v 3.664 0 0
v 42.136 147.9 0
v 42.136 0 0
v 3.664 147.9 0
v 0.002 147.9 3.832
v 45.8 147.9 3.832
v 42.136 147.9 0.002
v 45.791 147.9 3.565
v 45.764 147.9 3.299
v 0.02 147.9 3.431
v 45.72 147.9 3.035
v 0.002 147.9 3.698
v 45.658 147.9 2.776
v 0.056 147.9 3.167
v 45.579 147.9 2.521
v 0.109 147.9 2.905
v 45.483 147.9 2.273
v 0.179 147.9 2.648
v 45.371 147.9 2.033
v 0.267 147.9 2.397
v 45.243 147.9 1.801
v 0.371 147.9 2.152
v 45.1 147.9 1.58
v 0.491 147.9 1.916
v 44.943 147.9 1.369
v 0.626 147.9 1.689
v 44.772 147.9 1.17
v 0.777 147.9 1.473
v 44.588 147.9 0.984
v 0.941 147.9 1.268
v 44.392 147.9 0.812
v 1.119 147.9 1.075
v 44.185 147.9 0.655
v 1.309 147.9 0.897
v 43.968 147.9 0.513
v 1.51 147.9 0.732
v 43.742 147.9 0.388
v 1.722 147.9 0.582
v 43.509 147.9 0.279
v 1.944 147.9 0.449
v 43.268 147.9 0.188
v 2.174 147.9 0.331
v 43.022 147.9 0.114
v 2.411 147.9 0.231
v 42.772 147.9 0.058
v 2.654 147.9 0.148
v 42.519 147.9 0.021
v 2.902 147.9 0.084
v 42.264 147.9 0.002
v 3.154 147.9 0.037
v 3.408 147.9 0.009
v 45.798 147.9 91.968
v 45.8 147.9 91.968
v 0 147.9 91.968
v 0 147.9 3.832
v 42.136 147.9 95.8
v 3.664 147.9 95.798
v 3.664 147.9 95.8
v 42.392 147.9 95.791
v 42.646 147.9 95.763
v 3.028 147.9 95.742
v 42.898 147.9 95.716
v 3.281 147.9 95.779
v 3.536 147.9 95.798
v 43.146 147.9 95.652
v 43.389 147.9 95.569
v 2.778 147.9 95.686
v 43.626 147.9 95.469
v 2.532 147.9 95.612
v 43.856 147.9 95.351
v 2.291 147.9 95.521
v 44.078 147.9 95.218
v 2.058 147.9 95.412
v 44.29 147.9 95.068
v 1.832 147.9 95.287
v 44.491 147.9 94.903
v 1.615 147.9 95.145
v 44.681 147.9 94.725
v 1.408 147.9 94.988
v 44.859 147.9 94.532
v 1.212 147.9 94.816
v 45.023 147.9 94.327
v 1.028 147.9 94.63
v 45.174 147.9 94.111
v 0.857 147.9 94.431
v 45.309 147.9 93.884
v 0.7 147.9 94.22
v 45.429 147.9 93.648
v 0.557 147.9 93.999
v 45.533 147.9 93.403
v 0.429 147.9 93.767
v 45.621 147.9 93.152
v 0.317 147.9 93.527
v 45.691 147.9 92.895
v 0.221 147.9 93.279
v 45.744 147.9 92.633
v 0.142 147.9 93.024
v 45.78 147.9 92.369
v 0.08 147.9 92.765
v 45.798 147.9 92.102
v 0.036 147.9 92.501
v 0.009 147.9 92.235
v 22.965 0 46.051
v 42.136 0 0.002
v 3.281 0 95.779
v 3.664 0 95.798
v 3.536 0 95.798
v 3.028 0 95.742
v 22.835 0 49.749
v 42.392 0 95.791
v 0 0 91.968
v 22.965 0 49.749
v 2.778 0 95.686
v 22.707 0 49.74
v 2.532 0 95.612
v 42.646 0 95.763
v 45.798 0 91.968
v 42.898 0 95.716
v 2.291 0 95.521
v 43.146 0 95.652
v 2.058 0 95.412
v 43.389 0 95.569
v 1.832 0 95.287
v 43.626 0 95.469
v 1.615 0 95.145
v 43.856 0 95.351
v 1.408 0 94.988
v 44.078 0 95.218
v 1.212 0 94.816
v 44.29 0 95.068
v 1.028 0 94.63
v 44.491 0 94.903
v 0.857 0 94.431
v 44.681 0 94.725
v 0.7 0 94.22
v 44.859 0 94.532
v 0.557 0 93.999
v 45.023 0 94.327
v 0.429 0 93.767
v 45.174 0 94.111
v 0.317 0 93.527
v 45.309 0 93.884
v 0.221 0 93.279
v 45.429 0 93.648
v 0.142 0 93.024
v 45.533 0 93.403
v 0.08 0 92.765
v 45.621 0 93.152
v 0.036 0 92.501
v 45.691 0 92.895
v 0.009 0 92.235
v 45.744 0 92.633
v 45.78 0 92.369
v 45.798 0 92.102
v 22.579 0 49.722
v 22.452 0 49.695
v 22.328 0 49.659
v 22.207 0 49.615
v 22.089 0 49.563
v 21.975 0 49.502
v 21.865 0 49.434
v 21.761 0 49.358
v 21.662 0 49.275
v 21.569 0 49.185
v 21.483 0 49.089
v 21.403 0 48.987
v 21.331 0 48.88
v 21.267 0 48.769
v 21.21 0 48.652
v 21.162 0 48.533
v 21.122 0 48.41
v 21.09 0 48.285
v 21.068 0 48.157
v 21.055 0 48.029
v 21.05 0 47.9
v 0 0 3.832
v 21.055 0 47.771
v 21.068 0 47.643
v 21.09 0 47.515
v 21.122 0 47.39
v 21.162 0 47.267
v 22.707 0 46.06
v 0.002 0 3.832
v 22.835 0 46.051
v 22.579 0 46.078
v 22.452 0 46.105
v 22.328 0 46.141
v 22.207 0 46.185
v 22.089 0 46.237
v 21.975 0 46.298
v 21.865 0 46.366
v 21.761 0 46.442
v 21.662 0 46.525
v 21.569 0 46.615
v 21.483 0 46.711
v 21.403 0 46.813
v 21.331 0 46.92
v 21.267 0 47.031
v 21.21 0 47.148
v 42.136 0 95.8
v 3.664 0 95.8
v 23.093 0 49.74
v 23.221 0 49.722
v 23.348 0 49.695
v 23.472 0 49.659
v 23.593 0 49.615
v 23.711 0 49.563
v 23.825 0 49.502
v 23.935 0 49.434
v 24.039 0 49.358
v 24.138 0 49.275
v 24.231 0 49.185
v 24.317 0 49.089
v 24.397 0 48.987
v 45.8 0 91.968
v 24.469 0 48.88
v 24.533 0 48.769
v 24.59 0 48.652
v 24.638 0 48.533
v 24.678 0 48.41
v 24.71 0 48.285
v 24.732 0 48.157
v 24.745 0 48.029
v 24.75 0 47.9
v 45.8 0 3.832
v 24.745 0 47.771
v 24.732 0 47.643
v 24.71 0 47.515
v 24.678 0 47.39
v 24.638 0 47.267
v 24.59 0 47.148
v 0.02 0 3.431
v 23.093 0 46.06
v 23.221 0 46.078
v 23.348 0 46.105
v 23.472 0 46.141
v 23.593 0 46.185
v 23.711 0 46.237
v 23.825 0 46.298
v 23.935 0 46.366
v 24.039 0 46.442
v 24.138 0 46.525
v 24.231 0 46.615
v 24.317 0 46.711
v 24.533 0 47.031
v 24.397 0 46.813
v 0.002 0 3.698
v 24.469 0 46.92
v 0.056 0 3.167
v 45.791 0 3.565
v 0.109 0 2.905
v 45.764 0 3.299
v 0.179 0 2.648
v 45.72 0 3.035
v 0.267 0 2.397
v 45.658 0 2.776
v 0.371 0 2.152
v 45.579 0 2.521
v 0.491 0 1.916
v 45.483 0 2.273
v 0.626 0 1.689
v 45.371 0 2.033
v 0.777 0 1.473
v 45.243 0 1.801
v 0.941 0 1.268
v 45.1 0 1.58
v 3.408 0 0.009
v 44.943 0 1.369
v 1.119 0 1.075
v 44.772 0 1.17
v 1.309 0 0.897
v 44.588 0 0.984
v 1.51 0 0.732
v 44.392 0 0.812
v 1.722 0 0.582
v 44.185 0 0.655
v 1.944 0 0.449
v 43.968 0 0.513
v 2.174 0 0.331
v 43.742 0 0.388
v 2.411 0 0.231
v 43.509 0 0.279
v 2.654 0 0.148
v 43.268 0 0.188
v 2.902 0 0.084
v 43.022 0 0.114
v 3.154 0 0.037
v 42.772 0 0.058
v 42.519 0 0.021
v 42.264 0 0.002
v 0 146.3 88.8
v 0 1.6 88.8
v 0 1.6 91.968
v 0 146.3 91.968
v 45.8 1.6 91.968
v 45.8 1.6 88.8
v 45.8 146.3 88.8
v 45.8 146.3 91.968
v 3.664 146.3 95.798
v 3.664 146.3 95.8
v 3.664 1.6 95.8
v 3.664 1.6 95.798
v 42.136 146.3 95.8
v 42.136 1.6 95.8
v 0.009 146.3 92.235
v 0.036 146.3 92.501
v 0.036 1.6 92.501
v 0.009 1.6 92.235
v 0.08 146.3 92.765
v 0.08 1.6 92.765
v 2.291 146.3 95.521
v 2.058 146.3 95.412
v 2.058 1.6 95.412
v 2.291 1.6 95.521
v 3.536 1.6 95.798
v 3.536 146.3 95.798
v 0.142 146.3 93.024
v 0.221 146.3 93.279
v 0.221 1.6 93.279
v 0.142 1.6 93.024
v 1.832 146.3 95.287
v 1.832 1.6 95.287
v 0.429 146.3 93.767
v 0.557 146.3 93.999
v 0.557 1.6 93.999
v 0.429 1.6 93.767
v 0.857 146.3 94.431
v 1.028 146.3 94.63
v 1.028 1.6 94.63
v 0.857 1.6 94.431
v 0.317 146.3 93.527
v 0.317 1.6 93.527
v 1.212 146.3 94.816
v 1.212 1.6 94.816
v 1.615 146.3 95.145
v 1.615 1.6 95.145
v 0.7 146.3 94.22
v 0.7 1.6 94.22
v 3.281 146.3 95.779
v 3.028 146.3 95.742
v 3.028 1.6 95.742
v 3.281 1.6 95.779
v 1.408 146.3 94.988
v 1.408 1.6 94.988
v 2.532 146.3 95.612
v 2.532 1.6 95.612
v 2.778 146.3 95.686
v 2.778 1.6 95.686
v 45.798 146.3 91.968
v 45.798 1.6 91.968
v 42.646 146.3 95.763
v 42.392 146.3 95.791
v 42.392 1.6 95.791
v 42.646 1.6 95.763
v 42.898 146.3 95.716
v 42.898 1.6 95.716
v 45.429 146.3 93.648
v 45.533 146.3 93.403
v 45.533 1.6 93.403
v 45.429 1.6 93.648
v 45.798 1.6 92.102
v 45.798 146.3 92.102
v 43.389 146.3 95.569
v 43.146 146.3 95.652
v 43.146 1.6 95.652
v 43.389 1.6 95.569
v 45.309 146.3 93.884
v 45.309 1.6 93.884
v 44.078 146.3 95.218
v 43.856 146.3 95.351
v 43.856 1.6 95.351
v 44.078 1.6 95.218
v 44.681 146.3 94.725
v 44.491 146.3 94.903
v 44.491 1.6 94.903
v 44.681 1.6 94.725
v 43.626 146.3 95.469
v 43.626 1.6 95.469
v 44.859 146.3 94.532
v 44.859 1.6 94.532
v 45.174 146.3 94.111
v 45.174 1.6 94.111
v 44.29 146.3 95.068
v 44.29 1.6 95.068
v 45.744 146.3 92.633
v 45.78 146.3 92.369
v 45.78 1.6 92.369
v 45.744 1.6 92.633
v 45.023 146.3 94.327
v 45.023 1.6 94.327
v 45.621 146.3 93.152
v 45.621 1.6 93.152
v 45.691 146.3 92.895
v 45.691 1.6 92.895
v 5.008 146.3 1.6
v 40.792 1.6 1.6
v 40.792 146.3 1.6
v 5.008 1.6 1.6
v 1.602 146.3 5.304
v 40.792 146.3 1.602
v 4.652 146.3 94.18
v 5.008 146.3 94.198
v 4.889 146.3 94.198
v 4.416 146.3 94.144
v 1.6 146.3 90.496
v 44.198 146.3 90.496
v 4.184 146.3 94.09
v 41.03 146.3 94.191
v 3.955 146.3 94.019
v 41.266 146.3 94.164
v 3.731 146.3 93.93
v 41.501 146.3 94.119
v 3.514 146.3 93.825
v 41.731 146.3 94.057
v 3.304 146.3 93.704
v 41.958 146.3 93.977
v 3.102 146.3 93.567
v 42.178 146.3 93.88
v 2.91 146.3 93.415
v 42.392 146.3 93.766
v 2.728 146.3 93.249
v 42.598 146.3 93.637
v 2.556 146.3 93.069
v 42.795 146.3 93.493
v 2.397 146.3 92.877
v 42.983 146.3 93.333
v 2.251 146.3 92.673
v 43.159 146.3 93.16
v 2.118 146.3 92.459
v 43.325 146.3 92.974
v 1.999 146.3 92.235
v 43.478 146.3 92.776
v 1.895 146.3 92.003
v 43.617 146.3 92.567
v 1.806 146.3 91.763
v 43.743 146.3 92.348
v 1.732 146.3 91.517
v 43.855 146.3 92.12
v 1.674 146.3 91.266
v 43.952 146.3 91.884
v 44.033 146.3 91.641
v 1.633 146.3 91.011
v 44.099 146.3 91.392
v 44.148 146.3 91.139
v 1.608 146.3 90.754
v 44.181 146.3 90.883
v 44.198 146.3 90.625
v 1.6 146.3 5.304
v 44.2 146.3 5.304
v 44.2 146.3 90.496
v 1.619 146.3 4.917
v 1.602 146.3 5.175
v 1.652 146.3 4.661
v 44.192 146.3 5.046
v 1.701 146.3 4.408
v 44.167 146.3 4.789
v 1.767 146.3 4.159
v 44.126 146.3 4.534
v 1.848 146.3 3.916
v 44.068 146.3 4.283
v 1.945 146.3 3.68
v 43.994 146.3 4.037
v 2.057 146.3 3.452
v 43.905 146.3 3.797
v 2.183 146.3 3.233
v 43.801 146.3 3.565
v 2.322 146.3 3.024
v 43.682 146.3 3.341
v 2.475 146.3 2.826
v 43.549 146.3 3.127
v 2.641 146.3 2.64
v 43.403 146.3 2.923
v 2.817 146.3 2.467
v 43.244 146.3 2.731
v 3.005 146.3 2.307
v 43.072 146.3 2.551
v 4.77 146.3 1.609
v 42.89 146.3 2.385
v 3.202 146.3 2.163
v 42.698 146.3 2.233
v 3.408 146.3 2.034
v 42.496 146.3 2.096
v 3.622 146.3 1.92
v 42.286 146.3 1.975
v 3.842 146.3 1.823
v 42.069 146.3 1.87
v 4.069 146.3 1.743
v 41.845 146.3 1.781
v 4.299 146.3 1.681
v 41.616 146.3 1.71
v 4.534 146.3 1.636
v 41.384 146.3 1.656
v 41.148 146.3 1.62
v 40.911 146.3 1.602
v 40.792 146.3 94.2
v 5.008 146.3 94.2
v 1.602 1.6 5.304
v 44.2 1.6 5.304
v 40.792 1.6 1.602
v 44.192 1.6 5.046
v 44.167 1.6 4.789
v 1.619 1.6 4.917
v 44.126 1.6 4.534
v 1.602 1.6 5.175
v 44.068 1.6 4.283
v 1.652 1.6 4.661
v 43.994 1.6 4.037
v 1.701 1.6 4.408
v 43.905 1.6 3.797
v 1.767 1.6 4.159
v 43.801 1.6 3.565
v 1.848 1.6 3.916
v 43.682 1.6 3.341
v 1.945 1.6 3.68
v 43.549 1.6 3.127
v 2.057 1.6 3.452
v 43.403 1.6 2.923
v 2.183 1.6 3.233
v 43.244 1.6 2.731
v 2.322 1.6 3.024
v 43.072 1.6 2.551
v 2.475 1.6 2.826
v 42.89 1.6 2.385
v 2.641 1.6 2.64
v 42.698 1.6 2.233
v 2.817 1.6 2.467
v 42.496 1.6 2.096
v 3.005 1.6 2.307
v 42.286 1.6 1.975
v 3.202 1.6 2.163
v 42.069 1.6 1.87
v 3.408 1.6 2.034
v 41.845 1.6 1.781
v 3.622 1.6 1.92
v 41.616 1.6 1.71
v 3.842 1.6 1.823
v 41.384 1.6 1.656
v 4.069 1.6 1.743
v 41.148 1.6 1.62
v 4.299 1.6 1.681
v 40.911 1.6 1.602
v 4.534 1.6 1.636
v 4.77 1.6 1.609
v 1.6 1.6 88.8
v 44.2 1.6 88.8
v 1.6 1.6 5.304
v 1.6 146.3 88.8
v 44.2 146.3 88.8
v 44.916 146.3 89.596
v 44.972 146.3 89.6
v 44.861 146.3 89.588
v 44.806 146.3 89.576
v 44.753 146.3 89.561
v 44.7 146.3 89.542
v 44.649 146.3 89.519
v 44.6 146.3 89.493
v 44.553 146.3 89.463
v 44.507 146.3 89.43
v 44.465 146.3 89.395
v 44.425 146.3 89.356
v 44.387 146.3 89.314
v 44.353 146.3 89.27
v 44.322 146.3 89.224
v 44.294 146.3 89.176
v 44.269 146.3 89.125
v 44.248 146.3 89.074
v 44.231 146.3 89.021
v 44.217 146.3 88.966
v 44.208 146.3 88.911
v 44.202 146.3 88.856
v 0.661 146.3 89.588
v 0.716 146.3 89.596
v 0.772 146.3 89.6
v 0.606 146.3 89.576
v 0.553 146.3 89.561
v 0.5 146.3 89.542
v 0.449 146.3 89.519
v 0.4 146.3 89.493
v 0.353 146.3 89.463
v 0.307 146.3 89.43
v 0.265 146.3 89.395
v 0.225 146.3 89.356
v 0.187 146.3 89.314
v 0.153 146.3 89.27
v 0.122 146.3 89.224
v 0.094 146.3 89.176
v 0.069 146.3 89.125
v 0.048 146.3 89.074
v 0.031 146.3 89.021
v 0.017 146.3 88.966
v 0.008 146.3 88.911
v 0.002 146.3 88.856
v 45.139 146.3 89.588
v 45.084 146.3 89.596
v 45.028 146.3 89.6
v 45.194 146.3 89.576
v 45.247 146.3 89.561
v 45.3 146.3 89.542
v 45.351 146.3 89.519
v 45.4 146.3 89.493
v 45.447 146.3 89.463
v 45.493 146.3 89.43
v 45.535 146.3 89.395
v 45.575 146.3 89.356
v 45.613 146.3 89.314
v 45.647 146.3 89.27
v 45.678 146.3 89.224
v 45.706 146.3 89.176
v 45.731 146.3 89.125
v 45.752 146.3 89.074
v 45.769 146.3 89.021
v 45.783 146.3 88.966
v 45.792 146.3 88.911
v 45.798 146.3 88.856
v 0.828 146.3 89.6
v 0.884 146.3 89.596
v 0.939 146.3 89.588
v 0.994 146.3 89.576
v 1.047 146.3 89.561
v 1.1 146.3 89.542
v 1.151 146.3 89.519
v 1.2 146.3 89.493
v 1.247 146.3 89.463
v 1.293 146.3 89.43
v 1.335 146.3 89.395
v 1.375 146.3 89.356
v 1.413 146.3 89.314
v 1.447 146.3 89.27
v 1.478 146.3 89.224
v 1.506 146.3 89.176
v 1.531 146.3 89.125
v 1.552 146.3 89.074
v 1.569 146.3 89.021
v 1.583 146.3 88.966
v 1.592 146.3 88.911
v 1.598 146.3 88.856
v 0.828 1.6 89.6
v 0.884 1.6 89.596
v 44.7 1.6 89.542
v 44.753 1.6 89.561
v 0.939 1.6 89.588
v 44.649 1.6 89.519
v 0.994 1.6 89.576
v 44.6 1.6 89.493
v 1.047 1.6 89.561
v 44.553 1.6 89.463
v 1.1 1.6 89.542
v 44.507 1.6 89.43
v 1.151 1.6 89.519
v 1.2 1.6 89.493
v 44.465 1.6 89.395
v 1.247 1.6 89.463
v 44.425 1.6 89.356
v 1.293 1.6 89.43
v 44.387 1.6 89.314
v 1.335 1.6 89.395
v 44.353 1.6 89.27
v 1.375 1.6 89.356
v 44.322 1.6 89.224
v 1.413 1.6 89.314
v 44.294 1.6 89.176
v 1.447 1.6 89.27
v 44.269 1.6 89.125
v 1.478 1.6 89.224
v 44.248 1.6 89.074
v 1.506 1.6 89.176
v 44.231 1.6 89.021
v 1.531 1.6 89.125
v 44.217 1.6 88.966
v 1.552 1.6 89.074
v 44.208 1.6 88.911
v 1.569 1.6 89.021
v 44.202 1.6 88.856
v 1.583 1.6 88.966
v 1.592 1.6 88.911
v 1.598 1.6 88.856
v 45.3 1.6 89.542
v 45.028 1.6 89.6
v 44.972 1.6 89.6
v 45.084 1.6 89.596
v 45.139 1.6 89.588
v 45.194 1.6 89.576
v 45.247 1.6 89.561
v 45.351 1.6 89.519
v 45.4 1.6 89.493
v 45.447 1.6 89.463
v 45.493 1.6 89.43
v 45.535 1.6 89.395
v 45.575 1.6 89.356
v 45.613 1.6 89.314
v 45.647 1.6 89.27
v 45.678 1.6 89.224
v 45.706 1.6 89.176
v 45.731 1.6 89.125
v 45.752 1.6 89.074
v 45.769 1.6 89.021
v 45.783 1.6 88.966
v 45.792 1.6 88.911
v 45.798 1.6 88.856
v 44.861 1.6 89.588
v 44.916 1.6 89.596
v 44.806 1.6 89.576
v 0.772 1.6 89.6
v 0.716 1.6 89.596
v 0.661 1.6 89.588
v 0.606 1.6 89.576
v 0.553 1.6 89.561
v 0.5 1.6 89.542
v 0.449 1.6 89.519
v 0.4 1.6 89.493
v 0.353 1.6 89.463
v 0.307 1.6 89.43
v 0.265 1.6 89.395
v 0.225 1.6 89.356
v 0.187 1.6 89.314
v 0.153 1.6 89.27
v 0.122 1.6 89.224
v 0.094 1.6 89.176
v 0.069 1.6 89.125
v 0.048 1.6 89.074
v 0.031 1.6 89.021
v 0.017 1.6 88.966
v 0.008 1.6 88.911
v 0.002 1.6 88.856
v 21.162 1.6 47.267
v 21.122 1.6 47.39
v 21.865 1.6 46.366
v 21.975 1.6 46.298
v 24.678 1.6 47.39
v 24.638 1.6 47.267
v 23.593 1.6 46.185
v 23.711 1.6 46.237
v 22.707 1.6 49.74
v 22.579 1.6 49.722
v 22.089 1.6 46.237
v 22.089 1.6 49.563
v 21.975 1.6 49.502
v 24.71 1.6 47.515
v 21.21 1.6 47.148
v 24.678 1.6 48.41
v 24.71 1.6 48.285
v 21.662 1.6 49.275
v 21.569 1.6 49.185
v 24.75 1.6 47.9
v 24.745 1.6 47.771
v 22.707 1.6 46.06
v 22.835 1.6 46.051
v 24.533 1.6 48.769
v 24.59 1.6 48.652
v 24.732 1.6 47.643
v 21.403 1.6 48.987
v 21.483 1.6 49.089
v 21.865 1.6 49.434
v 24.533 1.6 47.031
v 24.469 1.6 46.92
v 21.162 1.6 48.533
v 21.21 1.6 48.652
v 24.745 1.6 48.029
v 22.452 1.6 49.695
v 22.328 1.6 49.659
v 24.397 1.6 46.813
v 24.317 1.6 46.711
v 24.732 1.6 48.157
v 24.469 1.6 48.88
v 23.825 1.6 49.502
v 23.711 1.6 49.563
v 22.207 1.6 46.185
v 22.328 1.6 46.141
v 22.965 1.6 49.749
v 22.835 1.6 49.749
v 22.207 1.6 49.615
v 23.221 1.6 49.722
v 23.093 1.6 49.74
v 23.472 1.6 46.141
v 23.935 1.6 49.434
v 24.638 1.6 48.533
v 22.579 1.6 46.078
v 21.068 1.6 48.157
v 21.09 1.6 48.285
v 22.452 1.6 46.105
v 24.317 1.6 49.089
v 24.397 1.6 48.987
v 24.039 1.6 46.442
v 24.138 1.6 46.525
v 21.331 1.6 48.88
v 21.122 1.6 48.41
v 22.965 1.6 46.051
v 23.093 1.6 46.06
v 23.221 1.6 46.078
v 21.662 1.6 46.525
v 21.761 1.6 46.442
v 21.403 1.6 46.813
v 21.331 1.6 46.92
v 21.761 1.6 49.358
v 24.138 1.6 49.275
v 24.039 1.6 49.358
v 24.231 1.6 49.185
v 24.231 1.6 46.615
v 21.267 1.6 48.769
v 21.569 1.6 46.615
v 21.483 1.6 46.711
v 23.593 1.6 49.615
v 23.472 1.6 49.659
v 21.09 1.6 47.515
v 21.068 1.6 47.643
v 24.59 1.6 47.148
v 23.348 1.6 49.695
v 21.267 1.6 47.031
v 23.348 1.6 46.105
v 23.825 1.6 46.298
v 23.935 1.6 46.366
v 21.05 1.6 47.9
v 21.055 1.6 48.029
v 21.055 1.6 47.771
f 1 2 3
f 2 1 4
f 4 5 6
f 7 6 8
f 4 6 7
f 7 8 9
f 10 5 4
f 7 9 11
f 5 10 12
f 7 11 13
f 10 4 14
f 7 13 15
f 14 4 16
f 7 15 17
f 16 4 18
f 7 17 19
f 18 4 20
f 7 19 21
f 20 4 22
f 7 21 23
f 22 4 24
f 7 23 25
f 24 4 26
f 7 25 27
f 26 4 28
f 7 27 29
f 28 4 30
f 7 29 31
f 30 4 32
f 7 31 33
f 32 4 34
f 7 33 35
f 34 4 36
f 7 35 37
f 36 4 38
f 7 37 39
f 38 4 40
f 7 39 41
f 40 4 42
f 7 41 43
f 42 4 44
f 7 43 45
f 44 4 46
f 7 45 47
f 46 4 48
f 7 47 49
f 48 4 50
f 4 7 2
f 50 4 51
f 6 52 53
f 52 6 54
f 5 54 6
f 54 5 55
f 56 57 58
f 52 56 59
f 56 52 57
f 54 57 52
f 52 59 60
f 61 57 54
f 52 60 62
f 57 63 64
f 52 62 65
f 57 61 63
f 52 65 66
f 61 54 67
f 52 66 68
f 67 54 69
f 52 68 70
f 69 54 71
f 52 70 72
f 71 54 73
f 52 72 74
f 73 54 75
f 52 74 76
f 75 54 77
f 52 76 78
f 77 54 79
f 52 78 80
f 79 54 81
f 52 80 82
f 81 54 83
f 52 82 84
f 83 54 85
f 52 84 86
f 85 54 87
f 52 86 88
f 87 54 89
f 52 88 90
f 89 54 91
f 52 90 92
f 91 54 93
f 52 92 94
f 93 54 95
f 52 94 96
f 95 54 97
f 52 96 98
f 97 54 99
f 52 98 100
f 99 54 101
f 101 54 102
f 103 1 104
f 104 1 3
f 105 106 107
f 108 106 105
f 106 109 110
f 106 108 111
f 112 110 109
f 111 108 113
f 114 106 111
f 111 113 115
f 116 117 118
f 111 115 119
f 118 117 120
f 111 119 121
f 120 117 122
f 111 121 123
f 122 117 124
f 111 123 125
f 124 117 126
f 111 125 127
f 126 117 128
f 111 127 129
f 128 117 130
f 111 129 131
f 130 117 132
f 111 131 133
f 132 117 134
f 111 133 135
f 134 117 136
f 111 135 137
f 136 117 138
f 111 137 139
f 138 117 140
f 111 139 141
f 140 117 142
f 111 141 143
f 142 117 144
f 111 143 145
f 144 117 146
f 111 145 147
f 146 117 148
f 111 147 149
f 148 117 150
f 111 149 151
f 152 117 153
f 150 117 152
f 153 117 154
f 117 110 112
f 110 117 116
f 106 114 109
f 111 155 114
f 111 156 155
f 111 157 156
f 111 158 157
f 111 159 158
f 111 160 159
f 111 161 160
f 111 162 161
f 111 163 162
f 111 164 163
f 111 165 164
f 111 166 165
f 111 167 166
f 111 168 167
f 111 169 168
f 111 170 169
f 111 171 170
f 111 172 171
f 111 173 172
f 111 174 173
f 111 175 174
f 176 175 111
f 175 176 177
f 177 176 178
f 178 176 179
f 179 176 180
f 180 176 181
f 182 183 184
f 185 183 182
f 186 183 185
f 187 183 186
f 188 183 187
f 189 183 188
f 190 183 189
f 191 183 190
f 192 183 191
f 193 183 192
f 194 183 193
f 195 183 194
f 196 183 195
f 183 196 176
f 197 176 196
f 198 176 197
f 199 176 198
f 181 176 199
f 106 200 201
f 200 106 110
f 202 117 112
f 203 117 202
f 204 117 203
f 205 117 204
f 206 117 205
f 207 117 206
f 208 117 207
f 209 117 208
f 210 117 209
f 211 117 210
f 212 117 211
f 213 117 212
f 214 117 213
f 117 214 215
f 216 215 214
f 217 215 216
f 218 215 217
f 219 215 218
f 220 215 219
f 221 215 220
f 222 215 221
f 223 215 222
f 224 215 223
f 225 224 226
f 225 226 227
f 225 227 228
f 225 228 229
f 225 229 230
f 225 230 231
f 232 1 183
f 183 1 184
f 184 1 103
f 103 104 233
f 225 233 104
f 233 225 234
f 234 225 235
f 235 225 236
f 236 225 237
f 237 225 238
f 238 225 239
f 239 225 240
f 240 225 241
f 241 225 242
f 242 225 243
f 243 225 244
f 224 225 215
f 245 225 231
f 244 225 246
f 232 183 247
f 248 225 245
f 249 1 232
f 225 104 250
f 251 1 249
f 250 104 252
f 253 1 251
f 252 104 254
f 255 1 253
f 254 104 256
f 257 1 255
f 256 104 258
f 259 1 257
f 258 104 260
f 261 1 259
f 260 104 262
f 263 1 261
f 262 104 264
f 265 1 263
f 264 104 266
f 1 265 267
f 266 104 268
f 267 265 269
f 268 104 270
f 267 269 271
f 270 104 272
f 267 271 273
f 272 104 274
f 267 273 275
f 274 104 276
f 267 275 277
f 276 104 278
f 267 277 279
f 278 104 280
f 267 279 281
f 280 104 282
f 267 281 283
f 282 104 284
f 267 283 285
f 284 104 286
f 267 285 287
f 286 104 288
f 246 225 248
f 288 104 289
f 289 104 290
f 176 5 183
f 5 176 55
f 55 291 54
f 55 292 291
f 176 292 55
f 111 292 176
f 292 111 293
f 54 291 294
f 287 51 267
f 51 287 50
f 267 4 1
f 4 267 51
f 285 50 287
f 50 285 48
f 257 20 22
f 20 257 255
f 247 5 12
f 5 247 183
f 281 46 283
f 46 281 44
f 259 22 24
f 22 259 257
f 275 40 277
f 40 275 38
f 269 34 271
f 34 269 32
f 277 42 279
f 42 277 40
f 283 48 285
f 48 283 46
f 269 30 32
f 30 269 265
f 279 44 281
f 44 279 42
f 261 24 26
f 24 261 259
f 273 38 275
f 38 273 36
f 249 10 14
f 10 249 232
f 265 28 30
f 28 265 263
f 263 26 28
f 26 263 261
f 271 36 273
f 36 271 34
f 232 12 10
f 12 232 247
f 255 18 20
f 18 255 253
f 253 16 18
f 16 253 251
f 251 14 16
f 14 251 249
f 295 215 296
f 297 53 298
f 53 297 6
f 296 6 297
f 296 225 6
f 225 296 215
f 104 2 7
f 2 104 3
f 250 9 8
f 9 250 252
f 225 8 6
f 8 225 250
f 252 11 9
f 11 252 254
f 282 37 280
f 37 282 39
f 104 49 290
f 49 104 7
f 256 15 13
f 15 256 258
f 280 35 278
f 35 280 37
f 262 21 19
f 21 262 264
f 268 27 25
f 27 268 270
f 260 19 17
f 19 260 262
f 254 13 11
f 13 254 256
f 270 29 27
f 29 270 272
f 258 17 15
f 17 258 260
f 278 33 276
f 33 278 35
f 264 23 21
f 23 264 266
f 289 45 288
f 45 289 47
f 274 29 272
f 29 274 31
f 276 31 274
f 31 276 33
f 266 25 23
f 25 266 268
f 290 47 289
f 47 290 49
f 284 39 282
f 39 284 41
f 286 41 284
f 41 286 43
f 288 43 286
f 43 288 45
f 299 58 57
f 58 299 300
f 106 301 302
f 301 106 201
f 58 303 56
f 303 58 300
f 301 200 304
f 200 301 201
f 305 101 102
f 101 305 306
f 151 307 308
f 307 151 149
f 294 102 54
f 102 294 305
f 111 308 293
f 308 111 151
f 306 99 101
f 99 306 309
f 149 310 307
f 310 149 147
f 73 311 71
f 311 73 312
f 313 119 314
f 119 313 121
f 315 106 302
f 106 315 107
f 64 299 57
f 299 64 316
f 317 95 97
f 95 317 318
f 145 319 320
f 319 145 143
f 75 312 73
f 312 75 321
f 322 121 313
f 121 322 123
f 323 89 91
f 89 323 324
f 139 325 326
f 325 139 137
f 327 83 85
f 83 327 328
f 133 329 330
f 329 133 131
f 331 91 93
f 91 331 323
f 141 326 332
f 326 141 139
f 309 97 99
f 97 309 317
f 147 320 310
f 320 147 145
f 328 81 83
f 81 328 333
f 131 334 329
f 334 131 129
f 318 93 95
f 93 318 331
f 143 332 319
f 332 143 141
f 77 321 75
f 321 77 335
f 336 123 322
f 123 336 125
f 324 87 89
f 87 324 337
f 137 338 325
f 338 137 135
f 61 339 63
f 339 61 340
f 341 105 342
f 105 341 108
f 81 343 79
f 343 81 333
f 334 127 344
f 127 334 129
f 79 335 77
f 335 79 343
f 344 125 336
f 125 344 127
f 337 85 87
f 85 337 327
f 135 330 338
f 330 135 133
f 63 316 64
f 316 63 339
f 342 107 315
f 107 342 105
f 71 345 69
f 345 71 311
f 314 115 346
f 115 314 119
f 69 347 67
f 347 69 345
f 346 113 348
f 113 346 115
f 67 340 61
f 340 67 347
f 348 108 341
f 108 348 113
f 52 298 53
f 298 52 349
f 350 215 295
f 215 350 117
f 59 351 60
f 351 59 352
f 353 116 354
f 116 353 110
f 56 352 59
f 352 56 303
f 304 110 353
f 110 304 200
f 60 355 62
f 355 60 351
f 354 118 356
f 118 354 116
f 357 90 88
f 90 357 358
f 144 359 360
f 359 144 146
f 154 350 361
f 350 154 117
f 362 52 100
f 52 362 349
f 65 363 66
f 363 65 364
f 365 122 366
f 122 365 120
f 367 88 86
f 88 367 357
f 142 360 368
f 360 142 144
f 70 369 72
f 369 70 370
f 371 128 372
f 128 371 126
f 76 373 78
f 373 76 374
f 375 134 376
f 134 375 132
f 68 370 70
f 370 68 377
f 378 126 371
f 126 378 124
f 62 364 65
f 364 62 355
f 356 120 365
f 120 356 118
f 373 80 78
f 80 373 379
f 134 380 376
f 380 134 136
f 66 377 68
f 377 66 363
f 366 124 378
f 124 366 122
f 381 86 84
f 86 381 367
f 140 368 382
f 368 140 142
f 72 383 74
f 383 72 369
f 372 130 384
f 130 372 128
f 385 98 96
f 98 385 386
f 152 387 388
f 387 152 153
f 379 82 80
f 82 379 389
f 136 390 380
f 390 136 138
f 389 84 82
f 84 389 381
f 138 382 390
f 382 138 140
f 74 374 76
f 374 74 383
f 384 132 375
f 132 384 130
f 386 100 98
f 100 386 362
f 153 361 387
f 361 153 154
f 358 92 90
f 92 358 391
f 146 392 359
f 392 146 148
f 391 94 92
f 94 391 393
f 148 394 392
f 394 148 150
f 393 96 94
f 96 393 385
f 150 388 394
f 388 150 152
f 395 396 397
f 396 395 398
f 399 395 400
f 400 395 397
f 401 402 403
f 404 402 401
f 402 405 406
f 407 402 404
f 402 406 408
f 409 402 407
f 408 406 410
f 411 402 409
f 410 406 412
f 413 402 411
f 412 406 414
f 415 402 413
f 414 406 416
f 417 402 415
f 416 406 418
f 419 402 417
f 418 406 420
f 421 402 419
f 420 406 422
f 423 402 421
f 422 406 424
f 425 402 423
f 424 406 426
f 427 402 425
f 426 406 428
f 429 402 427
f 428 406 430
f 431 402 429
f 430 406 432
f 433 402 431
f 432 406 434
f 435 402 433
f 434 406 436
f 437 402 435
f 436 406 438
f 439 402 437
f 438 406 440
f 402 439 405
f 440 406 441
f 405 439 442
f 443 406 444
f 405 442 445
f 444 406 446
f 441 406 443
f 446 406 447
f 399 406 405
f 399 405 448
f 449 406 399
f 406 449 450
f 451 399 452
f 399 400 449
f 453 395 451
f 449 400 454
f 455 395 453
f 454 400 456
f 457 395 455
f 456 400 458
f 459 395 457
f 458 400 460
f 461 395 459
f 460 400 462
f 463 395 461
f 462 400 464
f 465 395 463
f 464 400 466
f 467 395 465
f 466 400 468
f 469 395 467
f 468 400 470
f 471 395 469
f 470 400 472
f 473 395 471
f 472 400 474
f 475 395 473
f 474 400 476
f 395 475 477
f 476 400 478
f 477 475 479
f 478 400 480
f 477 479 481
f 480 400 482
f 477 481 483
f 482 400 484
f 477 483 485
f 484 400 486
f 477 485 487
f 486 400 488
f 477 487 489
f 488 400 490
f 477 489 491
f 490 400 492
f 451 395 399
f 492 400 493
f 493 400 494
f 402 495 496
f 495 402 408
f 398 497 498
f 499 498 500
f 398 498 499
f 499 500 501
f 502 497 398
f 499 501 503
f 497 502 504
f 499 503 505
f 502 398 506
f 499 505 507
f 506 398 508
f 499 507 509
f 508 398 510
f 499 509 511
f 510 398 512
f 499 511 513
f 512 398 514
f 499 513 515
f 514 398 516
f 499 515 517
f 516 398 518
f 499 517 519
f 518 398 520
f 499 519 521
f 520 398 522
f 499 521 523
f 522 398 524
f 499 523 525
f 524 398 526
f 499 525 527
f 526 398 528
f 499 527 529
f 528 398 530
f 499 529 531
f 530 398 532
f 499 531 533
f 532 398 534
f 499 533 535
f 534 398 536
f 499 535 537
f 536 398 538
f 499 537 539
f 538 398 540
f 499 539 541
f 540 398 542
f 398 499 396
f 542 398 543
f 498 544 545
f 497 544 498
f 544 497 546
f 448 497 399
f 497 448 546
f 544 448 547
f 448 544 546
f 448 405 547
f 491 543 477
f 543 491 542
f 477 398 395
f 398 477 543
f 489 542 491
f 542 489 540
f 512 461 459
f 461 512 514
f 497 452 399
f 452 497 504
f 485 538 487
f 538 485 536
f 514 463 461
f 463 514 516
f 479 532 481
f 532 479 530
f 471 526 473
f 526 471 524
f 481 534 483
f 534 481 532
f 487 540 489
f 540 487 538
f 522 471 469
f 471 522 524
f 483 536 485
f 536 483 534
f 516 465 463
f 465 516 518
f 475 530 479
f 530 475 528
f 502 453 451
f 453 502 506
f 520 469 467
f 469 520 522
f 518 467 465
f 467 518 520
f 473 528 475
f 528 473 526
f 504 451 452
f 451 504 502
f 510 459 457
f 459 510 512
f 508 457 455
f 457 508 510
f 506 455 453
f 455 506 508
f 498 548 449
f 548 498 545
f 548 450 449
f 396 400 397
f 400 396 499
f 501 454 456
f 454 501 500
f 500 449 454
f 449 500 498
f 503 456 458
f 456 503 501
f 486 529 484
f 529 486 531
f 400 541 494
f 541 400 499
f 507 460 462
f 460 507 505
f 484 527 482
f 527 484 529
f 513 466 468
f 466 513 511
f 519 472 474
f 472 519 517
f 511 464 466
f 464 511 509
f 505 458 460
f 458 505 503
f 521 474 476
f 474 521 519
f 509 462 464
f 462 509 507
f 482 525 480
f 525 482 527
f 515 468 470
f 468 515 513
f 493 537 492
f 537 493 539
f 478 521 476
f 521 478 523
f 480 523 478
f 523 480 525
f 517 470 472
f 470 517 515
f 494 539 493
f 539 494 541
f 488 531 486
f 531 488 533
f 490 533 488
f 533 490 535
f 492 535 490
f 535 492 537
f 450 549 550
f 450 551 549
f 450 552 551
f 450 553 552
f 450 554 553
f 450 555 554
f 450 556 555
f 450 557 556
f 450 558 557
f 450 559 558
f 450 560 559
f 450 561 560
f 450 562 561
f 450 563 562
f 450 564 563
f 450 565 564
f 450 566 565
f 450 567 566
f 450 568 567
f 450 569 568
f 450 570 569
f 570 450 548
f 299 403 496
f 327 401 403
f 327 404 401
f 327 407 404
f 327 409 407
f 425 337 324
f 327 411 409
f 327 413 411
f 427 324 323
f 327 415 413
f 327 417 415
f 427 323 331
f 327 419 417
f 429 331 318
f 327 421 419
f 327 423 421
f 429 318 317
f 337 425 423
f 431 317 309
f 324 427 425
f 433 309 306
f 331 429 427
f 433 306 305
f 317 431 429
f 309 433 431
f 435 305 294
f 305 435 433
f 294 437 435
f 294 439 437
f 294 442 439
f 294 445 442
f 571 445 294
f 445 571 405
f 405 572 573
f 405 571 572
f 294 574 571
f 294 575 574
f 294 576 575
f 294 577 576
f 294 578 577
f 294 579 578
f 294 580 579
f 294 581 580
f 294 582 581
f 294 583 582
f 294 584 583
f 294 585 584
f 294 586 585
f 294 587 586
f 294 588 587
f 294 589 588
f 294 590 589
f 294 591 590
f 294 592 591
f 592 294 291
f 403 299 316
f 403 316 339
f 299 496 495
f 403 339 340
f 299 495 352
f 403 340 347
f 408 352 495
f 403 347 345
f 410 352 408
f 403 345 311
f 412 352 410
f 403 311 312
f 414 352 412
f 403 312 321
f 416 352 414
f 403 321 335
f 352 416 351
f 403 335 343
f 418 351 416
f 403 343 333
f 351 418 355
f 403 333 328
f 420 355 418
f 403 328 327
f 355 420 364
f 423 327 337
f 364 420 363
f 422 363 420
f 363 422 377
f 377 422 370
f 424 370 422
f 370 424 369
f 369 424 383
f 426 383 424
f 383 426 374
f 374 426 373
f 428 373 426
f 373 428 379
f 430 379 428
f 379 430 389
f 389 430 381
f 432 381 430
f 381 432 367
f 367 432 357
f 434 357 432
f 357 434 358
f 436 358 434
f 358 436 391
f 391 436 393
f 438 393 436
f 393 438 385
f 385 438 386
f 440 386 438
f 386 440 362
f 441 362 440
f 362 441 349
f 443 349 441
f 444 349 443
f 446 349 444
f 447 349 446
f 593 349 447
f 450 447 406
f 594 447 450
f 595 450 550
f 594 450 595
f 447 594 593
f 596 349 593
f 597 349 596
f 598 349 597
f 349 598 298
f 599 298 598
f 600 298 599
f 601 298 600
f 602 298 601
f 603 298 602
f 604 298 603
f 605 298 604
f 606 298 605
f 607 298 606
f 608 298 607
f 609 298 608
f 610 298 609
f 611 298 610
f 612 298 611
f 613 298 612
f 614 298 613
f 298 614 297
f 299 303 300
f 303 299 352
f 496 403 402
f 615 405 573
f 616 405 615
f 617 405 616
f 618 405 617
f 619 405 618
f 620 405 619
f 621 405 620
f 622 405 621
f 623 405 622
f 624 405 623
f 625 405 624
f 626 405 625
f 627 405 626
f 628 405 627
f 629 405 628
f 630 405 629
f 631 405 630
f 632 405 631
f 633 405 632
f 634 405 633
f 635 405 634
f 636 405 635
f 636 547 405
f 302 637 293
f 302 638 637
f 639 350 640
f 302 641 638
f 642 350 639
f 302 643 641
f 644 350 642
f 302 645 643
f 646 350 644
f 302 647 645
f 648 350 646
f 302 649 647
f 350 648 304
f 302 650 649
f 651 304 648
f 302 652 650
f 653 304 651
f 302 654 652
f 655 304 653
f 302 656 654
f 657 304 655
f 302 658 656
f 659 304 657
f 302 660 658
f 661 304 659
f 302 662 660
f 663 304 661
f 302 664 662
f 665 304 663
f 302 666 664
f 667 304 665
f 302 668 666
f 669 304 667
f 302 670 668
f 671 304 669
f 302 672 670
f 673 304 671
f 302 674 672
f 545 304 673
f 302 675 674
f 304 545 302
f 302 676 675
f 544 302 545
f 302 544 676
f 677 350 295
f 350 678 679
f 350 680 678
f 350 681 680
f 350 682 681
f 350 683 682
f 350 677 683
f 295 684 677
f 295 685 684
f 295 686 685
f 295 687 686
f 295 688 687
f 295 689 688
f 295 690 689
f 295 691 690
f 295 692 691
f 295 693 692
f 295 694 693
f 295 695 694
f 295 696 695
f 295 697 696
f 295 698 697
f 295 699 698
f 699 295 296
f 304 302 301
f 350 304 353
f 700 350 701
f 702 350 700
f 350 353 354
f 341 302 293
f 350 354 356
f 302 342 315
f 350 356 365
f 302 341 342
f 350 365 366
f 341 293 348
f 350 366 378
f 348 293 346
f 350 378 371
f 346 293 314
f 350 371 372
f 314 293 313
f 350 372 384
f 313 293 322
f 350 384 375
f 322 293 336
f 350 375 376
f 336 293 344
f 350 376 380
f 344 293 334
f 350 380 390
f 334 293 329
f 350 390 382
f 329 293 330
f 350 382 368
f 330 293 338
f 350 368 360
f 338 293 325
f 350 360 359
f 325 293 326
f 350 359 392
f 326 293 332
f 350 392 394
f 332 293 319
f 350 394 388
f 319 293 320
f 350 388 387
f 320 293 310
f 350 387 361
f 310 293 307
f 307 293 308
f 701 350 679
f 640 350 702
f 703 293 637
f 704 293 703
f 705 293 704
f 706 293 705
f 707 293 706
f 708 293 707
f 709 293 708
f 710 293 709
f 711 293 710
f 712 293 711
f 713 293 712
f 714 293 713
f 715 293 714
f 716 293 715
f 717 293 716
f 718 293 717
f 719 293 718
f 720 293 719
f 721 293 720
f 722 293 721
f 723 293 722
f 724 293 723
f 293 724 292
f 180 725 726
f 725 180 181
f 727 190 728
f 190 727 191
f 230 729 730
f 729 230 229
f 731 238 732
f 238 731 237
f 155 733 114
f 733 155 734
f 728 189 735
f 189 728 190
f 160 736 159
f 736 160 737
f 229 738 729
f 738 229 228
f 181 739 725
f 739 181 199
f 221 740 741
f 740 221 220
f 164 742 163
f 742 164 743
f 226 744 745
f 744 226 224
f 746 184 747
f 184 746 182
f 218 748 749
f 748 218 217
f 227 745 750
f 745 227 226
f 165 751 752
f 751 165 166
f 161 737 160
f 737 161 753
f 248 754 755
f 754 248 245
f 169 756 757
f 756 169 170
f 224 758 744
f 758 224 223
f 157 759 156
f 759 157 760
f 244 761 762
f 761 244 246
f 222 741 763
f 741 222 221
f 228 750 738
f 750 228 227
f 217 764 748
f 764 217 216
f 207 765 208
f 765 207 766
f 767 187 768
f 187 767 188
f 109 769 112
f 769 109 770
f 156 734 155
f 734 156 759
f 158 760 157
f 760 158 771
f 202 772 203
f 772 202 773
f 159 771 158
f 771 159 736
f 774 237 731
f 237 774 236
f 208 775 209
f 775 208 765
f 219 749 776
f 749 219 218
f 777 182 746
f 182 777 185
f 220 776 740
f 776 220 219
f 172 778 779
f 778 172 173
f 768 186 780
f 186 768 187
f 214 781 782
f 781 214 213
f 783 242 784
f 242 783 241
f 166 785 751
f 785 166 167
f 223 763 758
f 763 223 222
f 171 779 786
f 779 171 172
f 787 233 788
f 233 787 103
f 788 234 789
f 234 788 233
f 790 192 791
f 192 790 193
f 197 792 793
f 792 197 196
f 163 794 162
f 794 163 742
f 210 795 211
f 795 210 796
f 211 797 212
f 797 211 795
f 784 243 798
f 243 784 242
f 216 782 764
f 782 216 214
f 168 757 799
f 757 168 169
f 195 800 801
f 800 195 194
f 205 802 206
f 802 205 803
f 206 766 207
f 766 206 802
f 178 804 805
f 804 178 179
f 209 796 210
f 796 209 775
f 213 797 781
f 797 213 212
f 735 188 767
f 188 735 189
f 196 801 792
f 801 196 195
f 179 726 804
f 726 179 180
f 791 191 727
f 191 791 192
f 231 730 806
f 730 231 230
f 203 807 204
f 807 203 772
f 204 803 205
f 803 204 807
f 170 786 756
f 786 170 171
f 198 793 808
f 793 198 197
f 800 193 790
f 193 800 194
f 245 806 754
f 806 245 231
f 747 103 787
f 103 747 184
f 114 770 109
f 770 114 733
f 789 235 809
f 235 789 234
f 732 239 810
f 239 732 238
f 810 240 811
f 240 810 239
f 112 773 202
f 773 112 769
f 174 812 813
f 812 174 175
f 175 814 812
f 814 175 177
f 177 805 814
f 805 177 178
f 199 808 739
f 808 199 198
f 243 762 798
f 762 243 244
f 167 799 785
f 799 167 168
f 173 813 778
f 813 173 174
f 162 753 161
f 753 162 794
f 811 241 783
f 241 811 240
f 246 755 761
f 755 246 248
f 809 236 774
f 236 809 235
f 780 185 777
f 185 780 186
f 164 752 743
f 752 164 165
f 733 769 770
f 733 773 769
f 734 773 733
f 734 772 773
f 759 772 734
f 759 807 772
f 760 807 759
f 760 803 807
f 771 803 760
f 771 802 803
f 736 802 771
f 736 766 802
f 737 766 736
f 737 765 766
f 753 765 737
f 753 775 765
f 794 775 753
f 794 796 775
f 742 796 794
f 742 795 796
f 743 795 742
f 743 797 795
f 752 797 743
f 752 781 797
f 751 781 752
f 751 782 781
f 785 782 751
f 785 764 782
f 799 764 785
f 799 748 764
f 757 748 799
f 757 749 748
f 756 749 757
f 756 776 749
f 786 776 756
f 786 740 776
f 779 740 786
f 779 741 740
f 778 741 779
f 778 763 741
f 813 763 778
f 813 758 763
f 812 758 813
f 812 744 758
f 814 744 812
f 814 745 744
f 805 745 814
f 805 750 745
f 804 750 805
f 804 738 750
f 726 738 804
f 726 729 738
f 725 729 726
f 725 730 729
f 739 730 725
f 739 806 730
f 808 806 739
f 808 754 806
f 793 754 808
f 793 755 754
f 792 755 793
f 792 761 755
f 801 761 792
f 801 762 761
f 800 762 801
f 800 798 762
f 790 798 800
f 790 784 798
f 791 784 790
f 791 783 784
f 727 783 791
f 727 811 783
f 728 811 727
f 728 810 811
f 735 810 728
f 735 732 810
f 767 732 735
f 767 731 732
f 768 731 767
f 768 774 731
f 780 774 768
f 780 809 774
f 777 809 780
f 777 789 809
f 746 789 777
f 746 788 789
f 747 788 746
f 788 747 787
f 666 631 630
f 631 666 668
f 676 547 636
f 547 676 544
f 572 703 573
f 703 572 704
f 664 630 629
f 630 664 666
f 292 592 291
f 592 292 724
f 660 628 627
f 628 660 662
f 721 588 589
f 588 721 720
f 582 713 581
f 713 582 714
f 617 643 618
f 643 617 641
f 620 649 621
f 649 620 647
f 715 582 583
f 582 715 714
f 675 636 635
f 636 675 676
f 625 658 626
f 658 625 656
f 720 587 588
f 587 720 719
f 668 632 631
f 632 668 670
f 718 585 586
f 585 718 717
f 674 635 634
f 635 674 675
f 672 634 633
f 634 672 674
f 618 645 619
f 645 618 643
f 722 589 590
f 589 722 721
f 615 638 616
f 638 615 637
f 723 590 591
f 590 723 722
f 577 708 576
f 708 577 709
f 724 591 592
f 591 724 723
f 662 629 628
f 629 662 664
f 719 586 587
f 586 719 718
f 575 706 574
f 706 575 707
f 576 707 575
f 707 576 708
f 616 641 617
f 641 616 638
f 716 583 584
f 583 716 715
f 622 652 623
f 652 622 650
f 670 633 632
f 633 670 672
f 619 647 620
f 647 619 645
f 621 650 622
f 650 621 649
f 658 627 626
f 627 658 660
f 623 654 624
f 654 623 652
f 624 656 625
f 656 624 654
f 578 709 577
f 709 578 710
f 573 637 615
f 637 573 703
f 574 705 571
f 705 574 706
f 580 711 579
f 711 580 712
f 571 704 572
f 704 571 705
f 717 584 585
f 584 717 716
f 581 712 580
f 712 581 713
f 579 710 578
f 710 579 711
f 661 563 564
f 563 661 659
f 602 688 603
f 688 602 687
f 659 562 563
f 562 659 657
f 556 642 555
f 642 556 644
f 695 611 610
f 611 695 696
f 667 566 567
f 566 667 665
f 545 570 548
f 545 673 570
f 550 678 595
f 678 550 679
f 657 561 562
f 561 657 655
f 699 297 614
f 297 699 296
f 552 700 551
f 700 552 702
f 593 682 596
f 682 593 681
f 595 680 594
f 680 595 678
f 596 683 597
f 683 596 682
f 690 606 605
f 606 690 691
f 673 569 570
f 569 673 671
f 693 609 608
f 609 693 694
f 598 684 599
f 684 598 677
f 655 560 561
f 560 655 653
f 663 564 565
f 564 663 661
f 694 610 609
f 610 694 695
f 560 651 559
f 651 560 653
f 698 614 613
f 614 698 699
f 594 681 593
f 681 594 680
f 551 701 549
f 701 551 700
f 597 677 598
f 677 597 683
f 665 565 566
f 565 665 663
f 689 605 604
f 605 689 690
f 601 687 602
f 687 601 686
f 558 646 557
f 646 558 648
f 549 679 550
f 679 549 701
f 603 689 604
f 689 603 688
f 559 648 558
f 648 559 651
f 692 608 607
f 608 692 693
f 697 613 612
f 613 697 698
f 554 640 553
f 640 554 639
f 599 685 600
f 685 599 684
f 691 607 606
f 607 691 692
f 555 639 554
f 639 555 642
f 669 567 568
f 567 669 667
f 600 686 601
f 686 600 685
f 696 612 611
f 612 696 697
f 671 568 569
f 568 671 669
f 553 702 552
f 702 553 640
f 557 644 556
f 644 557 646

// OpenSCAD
// file: ../../modules/hexagon.scad
module hexagon(r = 1) {
  polygon([
    [-1 * r, 0],
    [-.5 * r, r * sqrt(3) / 2],
    [.5 * r, r * sqrt(3) / 2],
    [1 * r, 0],
    [.5 * r, r * sqrt(3) / -2],
    [-.5 * r, r * sqrt(3) / -2],
  ]);
}
// file: ../../modules/fillet.scad
module fillet(r, l) {
  difference() {
    cube([r, r, l]);
    translate([0, 0, -.1]) cylinder(h = l + .2, r = r);
  }
}
// file: _common.scad
include <../../modules/fillet.scad>
include <../../modules/hexagon.scad>

$fa=4; // default minimum facet angle is now 0.5
$fs=0.05; // default minimum facet size is now 0.05 mm

unit = 50;

unitsWide = 1;
unitsTall = 2;

width = unitsWide * unit;
height = unitsTall * unit;
depth = 150;

wallThickness = 1.6;
sphereDetentRad = 2.4;

filletRad = 4;

tolerance = 0.5;

// M3 screw
screwRad = 1.6;
screwHeadRad = 3;
nutRad = 3.2;


module baseShape() {
  difference() {
    cube([width, depth, height]);
    translate([filletRad, 0, filletRad]) rotate([90, 90, 180]) fillet(r = filletRad, l = depth);
    translate([width - filletRad, 0, filletRad]) rotate([90, 180, 180]) fillet(r = filletRad, l = depth);
    translate([filletRad, 0, height - filletRad]) rotate([90, 0, 180]) fillet(r = filletRad, l = depth);
    translate([width - filletRad, 0, height - filletRad]) rotate([90, -90, 180]) fillet(r = filletRad, l = depth);
  }
}
// main file
include <_common.scad>

difference() {
  resize([width - wallThickness * 2 - tolerance * 2, depth - wallThickness - tolerance, height - wallThickness * 2 - tolerance * 2]) baseShape();
  translate([wallThickness, wallThickness, wallThickness]) resize([width - wallThickness * 4 - tolerance * 2, depth - wallThickness * 3 - tolerance, height - wallThickness * 4 - tolerance * 2]) baseShape();
  translate([0, wallThickness, height - filletRad * 2 - wallThickness * 2]) cube([width - wallThickness * 2, depth - wallThickness * 3 - tolerance, filletRad * 2]);

  translate([(width - wallThickness * 2 - tolerance * 2) / 2, wallThickness, (height - wallThickness * 2 - tolerance * 2) / 2]) rotate([90, 0, 0]) cylinder(r = screwRad + tolerance / 2, h = wallThickness);
}

translate([wallThickness / 2, wallThickness, height - filletRad * 2 - wallThickness * 2]) rotate([-90, 0, 0]) cylinder(r = wallThickness / 2, h =  depth - wallThickness * 3 - tolerance);
translate([width - wallThickness * 2.5 - tolerance * 2, wallThickness, height - filletRad * 2 - wallThickness * 2]) rotate([-90, 0, 0]) cylinder(r = wallThickness / 2, h =  depth - wallThickness * 3 - tolerance);
